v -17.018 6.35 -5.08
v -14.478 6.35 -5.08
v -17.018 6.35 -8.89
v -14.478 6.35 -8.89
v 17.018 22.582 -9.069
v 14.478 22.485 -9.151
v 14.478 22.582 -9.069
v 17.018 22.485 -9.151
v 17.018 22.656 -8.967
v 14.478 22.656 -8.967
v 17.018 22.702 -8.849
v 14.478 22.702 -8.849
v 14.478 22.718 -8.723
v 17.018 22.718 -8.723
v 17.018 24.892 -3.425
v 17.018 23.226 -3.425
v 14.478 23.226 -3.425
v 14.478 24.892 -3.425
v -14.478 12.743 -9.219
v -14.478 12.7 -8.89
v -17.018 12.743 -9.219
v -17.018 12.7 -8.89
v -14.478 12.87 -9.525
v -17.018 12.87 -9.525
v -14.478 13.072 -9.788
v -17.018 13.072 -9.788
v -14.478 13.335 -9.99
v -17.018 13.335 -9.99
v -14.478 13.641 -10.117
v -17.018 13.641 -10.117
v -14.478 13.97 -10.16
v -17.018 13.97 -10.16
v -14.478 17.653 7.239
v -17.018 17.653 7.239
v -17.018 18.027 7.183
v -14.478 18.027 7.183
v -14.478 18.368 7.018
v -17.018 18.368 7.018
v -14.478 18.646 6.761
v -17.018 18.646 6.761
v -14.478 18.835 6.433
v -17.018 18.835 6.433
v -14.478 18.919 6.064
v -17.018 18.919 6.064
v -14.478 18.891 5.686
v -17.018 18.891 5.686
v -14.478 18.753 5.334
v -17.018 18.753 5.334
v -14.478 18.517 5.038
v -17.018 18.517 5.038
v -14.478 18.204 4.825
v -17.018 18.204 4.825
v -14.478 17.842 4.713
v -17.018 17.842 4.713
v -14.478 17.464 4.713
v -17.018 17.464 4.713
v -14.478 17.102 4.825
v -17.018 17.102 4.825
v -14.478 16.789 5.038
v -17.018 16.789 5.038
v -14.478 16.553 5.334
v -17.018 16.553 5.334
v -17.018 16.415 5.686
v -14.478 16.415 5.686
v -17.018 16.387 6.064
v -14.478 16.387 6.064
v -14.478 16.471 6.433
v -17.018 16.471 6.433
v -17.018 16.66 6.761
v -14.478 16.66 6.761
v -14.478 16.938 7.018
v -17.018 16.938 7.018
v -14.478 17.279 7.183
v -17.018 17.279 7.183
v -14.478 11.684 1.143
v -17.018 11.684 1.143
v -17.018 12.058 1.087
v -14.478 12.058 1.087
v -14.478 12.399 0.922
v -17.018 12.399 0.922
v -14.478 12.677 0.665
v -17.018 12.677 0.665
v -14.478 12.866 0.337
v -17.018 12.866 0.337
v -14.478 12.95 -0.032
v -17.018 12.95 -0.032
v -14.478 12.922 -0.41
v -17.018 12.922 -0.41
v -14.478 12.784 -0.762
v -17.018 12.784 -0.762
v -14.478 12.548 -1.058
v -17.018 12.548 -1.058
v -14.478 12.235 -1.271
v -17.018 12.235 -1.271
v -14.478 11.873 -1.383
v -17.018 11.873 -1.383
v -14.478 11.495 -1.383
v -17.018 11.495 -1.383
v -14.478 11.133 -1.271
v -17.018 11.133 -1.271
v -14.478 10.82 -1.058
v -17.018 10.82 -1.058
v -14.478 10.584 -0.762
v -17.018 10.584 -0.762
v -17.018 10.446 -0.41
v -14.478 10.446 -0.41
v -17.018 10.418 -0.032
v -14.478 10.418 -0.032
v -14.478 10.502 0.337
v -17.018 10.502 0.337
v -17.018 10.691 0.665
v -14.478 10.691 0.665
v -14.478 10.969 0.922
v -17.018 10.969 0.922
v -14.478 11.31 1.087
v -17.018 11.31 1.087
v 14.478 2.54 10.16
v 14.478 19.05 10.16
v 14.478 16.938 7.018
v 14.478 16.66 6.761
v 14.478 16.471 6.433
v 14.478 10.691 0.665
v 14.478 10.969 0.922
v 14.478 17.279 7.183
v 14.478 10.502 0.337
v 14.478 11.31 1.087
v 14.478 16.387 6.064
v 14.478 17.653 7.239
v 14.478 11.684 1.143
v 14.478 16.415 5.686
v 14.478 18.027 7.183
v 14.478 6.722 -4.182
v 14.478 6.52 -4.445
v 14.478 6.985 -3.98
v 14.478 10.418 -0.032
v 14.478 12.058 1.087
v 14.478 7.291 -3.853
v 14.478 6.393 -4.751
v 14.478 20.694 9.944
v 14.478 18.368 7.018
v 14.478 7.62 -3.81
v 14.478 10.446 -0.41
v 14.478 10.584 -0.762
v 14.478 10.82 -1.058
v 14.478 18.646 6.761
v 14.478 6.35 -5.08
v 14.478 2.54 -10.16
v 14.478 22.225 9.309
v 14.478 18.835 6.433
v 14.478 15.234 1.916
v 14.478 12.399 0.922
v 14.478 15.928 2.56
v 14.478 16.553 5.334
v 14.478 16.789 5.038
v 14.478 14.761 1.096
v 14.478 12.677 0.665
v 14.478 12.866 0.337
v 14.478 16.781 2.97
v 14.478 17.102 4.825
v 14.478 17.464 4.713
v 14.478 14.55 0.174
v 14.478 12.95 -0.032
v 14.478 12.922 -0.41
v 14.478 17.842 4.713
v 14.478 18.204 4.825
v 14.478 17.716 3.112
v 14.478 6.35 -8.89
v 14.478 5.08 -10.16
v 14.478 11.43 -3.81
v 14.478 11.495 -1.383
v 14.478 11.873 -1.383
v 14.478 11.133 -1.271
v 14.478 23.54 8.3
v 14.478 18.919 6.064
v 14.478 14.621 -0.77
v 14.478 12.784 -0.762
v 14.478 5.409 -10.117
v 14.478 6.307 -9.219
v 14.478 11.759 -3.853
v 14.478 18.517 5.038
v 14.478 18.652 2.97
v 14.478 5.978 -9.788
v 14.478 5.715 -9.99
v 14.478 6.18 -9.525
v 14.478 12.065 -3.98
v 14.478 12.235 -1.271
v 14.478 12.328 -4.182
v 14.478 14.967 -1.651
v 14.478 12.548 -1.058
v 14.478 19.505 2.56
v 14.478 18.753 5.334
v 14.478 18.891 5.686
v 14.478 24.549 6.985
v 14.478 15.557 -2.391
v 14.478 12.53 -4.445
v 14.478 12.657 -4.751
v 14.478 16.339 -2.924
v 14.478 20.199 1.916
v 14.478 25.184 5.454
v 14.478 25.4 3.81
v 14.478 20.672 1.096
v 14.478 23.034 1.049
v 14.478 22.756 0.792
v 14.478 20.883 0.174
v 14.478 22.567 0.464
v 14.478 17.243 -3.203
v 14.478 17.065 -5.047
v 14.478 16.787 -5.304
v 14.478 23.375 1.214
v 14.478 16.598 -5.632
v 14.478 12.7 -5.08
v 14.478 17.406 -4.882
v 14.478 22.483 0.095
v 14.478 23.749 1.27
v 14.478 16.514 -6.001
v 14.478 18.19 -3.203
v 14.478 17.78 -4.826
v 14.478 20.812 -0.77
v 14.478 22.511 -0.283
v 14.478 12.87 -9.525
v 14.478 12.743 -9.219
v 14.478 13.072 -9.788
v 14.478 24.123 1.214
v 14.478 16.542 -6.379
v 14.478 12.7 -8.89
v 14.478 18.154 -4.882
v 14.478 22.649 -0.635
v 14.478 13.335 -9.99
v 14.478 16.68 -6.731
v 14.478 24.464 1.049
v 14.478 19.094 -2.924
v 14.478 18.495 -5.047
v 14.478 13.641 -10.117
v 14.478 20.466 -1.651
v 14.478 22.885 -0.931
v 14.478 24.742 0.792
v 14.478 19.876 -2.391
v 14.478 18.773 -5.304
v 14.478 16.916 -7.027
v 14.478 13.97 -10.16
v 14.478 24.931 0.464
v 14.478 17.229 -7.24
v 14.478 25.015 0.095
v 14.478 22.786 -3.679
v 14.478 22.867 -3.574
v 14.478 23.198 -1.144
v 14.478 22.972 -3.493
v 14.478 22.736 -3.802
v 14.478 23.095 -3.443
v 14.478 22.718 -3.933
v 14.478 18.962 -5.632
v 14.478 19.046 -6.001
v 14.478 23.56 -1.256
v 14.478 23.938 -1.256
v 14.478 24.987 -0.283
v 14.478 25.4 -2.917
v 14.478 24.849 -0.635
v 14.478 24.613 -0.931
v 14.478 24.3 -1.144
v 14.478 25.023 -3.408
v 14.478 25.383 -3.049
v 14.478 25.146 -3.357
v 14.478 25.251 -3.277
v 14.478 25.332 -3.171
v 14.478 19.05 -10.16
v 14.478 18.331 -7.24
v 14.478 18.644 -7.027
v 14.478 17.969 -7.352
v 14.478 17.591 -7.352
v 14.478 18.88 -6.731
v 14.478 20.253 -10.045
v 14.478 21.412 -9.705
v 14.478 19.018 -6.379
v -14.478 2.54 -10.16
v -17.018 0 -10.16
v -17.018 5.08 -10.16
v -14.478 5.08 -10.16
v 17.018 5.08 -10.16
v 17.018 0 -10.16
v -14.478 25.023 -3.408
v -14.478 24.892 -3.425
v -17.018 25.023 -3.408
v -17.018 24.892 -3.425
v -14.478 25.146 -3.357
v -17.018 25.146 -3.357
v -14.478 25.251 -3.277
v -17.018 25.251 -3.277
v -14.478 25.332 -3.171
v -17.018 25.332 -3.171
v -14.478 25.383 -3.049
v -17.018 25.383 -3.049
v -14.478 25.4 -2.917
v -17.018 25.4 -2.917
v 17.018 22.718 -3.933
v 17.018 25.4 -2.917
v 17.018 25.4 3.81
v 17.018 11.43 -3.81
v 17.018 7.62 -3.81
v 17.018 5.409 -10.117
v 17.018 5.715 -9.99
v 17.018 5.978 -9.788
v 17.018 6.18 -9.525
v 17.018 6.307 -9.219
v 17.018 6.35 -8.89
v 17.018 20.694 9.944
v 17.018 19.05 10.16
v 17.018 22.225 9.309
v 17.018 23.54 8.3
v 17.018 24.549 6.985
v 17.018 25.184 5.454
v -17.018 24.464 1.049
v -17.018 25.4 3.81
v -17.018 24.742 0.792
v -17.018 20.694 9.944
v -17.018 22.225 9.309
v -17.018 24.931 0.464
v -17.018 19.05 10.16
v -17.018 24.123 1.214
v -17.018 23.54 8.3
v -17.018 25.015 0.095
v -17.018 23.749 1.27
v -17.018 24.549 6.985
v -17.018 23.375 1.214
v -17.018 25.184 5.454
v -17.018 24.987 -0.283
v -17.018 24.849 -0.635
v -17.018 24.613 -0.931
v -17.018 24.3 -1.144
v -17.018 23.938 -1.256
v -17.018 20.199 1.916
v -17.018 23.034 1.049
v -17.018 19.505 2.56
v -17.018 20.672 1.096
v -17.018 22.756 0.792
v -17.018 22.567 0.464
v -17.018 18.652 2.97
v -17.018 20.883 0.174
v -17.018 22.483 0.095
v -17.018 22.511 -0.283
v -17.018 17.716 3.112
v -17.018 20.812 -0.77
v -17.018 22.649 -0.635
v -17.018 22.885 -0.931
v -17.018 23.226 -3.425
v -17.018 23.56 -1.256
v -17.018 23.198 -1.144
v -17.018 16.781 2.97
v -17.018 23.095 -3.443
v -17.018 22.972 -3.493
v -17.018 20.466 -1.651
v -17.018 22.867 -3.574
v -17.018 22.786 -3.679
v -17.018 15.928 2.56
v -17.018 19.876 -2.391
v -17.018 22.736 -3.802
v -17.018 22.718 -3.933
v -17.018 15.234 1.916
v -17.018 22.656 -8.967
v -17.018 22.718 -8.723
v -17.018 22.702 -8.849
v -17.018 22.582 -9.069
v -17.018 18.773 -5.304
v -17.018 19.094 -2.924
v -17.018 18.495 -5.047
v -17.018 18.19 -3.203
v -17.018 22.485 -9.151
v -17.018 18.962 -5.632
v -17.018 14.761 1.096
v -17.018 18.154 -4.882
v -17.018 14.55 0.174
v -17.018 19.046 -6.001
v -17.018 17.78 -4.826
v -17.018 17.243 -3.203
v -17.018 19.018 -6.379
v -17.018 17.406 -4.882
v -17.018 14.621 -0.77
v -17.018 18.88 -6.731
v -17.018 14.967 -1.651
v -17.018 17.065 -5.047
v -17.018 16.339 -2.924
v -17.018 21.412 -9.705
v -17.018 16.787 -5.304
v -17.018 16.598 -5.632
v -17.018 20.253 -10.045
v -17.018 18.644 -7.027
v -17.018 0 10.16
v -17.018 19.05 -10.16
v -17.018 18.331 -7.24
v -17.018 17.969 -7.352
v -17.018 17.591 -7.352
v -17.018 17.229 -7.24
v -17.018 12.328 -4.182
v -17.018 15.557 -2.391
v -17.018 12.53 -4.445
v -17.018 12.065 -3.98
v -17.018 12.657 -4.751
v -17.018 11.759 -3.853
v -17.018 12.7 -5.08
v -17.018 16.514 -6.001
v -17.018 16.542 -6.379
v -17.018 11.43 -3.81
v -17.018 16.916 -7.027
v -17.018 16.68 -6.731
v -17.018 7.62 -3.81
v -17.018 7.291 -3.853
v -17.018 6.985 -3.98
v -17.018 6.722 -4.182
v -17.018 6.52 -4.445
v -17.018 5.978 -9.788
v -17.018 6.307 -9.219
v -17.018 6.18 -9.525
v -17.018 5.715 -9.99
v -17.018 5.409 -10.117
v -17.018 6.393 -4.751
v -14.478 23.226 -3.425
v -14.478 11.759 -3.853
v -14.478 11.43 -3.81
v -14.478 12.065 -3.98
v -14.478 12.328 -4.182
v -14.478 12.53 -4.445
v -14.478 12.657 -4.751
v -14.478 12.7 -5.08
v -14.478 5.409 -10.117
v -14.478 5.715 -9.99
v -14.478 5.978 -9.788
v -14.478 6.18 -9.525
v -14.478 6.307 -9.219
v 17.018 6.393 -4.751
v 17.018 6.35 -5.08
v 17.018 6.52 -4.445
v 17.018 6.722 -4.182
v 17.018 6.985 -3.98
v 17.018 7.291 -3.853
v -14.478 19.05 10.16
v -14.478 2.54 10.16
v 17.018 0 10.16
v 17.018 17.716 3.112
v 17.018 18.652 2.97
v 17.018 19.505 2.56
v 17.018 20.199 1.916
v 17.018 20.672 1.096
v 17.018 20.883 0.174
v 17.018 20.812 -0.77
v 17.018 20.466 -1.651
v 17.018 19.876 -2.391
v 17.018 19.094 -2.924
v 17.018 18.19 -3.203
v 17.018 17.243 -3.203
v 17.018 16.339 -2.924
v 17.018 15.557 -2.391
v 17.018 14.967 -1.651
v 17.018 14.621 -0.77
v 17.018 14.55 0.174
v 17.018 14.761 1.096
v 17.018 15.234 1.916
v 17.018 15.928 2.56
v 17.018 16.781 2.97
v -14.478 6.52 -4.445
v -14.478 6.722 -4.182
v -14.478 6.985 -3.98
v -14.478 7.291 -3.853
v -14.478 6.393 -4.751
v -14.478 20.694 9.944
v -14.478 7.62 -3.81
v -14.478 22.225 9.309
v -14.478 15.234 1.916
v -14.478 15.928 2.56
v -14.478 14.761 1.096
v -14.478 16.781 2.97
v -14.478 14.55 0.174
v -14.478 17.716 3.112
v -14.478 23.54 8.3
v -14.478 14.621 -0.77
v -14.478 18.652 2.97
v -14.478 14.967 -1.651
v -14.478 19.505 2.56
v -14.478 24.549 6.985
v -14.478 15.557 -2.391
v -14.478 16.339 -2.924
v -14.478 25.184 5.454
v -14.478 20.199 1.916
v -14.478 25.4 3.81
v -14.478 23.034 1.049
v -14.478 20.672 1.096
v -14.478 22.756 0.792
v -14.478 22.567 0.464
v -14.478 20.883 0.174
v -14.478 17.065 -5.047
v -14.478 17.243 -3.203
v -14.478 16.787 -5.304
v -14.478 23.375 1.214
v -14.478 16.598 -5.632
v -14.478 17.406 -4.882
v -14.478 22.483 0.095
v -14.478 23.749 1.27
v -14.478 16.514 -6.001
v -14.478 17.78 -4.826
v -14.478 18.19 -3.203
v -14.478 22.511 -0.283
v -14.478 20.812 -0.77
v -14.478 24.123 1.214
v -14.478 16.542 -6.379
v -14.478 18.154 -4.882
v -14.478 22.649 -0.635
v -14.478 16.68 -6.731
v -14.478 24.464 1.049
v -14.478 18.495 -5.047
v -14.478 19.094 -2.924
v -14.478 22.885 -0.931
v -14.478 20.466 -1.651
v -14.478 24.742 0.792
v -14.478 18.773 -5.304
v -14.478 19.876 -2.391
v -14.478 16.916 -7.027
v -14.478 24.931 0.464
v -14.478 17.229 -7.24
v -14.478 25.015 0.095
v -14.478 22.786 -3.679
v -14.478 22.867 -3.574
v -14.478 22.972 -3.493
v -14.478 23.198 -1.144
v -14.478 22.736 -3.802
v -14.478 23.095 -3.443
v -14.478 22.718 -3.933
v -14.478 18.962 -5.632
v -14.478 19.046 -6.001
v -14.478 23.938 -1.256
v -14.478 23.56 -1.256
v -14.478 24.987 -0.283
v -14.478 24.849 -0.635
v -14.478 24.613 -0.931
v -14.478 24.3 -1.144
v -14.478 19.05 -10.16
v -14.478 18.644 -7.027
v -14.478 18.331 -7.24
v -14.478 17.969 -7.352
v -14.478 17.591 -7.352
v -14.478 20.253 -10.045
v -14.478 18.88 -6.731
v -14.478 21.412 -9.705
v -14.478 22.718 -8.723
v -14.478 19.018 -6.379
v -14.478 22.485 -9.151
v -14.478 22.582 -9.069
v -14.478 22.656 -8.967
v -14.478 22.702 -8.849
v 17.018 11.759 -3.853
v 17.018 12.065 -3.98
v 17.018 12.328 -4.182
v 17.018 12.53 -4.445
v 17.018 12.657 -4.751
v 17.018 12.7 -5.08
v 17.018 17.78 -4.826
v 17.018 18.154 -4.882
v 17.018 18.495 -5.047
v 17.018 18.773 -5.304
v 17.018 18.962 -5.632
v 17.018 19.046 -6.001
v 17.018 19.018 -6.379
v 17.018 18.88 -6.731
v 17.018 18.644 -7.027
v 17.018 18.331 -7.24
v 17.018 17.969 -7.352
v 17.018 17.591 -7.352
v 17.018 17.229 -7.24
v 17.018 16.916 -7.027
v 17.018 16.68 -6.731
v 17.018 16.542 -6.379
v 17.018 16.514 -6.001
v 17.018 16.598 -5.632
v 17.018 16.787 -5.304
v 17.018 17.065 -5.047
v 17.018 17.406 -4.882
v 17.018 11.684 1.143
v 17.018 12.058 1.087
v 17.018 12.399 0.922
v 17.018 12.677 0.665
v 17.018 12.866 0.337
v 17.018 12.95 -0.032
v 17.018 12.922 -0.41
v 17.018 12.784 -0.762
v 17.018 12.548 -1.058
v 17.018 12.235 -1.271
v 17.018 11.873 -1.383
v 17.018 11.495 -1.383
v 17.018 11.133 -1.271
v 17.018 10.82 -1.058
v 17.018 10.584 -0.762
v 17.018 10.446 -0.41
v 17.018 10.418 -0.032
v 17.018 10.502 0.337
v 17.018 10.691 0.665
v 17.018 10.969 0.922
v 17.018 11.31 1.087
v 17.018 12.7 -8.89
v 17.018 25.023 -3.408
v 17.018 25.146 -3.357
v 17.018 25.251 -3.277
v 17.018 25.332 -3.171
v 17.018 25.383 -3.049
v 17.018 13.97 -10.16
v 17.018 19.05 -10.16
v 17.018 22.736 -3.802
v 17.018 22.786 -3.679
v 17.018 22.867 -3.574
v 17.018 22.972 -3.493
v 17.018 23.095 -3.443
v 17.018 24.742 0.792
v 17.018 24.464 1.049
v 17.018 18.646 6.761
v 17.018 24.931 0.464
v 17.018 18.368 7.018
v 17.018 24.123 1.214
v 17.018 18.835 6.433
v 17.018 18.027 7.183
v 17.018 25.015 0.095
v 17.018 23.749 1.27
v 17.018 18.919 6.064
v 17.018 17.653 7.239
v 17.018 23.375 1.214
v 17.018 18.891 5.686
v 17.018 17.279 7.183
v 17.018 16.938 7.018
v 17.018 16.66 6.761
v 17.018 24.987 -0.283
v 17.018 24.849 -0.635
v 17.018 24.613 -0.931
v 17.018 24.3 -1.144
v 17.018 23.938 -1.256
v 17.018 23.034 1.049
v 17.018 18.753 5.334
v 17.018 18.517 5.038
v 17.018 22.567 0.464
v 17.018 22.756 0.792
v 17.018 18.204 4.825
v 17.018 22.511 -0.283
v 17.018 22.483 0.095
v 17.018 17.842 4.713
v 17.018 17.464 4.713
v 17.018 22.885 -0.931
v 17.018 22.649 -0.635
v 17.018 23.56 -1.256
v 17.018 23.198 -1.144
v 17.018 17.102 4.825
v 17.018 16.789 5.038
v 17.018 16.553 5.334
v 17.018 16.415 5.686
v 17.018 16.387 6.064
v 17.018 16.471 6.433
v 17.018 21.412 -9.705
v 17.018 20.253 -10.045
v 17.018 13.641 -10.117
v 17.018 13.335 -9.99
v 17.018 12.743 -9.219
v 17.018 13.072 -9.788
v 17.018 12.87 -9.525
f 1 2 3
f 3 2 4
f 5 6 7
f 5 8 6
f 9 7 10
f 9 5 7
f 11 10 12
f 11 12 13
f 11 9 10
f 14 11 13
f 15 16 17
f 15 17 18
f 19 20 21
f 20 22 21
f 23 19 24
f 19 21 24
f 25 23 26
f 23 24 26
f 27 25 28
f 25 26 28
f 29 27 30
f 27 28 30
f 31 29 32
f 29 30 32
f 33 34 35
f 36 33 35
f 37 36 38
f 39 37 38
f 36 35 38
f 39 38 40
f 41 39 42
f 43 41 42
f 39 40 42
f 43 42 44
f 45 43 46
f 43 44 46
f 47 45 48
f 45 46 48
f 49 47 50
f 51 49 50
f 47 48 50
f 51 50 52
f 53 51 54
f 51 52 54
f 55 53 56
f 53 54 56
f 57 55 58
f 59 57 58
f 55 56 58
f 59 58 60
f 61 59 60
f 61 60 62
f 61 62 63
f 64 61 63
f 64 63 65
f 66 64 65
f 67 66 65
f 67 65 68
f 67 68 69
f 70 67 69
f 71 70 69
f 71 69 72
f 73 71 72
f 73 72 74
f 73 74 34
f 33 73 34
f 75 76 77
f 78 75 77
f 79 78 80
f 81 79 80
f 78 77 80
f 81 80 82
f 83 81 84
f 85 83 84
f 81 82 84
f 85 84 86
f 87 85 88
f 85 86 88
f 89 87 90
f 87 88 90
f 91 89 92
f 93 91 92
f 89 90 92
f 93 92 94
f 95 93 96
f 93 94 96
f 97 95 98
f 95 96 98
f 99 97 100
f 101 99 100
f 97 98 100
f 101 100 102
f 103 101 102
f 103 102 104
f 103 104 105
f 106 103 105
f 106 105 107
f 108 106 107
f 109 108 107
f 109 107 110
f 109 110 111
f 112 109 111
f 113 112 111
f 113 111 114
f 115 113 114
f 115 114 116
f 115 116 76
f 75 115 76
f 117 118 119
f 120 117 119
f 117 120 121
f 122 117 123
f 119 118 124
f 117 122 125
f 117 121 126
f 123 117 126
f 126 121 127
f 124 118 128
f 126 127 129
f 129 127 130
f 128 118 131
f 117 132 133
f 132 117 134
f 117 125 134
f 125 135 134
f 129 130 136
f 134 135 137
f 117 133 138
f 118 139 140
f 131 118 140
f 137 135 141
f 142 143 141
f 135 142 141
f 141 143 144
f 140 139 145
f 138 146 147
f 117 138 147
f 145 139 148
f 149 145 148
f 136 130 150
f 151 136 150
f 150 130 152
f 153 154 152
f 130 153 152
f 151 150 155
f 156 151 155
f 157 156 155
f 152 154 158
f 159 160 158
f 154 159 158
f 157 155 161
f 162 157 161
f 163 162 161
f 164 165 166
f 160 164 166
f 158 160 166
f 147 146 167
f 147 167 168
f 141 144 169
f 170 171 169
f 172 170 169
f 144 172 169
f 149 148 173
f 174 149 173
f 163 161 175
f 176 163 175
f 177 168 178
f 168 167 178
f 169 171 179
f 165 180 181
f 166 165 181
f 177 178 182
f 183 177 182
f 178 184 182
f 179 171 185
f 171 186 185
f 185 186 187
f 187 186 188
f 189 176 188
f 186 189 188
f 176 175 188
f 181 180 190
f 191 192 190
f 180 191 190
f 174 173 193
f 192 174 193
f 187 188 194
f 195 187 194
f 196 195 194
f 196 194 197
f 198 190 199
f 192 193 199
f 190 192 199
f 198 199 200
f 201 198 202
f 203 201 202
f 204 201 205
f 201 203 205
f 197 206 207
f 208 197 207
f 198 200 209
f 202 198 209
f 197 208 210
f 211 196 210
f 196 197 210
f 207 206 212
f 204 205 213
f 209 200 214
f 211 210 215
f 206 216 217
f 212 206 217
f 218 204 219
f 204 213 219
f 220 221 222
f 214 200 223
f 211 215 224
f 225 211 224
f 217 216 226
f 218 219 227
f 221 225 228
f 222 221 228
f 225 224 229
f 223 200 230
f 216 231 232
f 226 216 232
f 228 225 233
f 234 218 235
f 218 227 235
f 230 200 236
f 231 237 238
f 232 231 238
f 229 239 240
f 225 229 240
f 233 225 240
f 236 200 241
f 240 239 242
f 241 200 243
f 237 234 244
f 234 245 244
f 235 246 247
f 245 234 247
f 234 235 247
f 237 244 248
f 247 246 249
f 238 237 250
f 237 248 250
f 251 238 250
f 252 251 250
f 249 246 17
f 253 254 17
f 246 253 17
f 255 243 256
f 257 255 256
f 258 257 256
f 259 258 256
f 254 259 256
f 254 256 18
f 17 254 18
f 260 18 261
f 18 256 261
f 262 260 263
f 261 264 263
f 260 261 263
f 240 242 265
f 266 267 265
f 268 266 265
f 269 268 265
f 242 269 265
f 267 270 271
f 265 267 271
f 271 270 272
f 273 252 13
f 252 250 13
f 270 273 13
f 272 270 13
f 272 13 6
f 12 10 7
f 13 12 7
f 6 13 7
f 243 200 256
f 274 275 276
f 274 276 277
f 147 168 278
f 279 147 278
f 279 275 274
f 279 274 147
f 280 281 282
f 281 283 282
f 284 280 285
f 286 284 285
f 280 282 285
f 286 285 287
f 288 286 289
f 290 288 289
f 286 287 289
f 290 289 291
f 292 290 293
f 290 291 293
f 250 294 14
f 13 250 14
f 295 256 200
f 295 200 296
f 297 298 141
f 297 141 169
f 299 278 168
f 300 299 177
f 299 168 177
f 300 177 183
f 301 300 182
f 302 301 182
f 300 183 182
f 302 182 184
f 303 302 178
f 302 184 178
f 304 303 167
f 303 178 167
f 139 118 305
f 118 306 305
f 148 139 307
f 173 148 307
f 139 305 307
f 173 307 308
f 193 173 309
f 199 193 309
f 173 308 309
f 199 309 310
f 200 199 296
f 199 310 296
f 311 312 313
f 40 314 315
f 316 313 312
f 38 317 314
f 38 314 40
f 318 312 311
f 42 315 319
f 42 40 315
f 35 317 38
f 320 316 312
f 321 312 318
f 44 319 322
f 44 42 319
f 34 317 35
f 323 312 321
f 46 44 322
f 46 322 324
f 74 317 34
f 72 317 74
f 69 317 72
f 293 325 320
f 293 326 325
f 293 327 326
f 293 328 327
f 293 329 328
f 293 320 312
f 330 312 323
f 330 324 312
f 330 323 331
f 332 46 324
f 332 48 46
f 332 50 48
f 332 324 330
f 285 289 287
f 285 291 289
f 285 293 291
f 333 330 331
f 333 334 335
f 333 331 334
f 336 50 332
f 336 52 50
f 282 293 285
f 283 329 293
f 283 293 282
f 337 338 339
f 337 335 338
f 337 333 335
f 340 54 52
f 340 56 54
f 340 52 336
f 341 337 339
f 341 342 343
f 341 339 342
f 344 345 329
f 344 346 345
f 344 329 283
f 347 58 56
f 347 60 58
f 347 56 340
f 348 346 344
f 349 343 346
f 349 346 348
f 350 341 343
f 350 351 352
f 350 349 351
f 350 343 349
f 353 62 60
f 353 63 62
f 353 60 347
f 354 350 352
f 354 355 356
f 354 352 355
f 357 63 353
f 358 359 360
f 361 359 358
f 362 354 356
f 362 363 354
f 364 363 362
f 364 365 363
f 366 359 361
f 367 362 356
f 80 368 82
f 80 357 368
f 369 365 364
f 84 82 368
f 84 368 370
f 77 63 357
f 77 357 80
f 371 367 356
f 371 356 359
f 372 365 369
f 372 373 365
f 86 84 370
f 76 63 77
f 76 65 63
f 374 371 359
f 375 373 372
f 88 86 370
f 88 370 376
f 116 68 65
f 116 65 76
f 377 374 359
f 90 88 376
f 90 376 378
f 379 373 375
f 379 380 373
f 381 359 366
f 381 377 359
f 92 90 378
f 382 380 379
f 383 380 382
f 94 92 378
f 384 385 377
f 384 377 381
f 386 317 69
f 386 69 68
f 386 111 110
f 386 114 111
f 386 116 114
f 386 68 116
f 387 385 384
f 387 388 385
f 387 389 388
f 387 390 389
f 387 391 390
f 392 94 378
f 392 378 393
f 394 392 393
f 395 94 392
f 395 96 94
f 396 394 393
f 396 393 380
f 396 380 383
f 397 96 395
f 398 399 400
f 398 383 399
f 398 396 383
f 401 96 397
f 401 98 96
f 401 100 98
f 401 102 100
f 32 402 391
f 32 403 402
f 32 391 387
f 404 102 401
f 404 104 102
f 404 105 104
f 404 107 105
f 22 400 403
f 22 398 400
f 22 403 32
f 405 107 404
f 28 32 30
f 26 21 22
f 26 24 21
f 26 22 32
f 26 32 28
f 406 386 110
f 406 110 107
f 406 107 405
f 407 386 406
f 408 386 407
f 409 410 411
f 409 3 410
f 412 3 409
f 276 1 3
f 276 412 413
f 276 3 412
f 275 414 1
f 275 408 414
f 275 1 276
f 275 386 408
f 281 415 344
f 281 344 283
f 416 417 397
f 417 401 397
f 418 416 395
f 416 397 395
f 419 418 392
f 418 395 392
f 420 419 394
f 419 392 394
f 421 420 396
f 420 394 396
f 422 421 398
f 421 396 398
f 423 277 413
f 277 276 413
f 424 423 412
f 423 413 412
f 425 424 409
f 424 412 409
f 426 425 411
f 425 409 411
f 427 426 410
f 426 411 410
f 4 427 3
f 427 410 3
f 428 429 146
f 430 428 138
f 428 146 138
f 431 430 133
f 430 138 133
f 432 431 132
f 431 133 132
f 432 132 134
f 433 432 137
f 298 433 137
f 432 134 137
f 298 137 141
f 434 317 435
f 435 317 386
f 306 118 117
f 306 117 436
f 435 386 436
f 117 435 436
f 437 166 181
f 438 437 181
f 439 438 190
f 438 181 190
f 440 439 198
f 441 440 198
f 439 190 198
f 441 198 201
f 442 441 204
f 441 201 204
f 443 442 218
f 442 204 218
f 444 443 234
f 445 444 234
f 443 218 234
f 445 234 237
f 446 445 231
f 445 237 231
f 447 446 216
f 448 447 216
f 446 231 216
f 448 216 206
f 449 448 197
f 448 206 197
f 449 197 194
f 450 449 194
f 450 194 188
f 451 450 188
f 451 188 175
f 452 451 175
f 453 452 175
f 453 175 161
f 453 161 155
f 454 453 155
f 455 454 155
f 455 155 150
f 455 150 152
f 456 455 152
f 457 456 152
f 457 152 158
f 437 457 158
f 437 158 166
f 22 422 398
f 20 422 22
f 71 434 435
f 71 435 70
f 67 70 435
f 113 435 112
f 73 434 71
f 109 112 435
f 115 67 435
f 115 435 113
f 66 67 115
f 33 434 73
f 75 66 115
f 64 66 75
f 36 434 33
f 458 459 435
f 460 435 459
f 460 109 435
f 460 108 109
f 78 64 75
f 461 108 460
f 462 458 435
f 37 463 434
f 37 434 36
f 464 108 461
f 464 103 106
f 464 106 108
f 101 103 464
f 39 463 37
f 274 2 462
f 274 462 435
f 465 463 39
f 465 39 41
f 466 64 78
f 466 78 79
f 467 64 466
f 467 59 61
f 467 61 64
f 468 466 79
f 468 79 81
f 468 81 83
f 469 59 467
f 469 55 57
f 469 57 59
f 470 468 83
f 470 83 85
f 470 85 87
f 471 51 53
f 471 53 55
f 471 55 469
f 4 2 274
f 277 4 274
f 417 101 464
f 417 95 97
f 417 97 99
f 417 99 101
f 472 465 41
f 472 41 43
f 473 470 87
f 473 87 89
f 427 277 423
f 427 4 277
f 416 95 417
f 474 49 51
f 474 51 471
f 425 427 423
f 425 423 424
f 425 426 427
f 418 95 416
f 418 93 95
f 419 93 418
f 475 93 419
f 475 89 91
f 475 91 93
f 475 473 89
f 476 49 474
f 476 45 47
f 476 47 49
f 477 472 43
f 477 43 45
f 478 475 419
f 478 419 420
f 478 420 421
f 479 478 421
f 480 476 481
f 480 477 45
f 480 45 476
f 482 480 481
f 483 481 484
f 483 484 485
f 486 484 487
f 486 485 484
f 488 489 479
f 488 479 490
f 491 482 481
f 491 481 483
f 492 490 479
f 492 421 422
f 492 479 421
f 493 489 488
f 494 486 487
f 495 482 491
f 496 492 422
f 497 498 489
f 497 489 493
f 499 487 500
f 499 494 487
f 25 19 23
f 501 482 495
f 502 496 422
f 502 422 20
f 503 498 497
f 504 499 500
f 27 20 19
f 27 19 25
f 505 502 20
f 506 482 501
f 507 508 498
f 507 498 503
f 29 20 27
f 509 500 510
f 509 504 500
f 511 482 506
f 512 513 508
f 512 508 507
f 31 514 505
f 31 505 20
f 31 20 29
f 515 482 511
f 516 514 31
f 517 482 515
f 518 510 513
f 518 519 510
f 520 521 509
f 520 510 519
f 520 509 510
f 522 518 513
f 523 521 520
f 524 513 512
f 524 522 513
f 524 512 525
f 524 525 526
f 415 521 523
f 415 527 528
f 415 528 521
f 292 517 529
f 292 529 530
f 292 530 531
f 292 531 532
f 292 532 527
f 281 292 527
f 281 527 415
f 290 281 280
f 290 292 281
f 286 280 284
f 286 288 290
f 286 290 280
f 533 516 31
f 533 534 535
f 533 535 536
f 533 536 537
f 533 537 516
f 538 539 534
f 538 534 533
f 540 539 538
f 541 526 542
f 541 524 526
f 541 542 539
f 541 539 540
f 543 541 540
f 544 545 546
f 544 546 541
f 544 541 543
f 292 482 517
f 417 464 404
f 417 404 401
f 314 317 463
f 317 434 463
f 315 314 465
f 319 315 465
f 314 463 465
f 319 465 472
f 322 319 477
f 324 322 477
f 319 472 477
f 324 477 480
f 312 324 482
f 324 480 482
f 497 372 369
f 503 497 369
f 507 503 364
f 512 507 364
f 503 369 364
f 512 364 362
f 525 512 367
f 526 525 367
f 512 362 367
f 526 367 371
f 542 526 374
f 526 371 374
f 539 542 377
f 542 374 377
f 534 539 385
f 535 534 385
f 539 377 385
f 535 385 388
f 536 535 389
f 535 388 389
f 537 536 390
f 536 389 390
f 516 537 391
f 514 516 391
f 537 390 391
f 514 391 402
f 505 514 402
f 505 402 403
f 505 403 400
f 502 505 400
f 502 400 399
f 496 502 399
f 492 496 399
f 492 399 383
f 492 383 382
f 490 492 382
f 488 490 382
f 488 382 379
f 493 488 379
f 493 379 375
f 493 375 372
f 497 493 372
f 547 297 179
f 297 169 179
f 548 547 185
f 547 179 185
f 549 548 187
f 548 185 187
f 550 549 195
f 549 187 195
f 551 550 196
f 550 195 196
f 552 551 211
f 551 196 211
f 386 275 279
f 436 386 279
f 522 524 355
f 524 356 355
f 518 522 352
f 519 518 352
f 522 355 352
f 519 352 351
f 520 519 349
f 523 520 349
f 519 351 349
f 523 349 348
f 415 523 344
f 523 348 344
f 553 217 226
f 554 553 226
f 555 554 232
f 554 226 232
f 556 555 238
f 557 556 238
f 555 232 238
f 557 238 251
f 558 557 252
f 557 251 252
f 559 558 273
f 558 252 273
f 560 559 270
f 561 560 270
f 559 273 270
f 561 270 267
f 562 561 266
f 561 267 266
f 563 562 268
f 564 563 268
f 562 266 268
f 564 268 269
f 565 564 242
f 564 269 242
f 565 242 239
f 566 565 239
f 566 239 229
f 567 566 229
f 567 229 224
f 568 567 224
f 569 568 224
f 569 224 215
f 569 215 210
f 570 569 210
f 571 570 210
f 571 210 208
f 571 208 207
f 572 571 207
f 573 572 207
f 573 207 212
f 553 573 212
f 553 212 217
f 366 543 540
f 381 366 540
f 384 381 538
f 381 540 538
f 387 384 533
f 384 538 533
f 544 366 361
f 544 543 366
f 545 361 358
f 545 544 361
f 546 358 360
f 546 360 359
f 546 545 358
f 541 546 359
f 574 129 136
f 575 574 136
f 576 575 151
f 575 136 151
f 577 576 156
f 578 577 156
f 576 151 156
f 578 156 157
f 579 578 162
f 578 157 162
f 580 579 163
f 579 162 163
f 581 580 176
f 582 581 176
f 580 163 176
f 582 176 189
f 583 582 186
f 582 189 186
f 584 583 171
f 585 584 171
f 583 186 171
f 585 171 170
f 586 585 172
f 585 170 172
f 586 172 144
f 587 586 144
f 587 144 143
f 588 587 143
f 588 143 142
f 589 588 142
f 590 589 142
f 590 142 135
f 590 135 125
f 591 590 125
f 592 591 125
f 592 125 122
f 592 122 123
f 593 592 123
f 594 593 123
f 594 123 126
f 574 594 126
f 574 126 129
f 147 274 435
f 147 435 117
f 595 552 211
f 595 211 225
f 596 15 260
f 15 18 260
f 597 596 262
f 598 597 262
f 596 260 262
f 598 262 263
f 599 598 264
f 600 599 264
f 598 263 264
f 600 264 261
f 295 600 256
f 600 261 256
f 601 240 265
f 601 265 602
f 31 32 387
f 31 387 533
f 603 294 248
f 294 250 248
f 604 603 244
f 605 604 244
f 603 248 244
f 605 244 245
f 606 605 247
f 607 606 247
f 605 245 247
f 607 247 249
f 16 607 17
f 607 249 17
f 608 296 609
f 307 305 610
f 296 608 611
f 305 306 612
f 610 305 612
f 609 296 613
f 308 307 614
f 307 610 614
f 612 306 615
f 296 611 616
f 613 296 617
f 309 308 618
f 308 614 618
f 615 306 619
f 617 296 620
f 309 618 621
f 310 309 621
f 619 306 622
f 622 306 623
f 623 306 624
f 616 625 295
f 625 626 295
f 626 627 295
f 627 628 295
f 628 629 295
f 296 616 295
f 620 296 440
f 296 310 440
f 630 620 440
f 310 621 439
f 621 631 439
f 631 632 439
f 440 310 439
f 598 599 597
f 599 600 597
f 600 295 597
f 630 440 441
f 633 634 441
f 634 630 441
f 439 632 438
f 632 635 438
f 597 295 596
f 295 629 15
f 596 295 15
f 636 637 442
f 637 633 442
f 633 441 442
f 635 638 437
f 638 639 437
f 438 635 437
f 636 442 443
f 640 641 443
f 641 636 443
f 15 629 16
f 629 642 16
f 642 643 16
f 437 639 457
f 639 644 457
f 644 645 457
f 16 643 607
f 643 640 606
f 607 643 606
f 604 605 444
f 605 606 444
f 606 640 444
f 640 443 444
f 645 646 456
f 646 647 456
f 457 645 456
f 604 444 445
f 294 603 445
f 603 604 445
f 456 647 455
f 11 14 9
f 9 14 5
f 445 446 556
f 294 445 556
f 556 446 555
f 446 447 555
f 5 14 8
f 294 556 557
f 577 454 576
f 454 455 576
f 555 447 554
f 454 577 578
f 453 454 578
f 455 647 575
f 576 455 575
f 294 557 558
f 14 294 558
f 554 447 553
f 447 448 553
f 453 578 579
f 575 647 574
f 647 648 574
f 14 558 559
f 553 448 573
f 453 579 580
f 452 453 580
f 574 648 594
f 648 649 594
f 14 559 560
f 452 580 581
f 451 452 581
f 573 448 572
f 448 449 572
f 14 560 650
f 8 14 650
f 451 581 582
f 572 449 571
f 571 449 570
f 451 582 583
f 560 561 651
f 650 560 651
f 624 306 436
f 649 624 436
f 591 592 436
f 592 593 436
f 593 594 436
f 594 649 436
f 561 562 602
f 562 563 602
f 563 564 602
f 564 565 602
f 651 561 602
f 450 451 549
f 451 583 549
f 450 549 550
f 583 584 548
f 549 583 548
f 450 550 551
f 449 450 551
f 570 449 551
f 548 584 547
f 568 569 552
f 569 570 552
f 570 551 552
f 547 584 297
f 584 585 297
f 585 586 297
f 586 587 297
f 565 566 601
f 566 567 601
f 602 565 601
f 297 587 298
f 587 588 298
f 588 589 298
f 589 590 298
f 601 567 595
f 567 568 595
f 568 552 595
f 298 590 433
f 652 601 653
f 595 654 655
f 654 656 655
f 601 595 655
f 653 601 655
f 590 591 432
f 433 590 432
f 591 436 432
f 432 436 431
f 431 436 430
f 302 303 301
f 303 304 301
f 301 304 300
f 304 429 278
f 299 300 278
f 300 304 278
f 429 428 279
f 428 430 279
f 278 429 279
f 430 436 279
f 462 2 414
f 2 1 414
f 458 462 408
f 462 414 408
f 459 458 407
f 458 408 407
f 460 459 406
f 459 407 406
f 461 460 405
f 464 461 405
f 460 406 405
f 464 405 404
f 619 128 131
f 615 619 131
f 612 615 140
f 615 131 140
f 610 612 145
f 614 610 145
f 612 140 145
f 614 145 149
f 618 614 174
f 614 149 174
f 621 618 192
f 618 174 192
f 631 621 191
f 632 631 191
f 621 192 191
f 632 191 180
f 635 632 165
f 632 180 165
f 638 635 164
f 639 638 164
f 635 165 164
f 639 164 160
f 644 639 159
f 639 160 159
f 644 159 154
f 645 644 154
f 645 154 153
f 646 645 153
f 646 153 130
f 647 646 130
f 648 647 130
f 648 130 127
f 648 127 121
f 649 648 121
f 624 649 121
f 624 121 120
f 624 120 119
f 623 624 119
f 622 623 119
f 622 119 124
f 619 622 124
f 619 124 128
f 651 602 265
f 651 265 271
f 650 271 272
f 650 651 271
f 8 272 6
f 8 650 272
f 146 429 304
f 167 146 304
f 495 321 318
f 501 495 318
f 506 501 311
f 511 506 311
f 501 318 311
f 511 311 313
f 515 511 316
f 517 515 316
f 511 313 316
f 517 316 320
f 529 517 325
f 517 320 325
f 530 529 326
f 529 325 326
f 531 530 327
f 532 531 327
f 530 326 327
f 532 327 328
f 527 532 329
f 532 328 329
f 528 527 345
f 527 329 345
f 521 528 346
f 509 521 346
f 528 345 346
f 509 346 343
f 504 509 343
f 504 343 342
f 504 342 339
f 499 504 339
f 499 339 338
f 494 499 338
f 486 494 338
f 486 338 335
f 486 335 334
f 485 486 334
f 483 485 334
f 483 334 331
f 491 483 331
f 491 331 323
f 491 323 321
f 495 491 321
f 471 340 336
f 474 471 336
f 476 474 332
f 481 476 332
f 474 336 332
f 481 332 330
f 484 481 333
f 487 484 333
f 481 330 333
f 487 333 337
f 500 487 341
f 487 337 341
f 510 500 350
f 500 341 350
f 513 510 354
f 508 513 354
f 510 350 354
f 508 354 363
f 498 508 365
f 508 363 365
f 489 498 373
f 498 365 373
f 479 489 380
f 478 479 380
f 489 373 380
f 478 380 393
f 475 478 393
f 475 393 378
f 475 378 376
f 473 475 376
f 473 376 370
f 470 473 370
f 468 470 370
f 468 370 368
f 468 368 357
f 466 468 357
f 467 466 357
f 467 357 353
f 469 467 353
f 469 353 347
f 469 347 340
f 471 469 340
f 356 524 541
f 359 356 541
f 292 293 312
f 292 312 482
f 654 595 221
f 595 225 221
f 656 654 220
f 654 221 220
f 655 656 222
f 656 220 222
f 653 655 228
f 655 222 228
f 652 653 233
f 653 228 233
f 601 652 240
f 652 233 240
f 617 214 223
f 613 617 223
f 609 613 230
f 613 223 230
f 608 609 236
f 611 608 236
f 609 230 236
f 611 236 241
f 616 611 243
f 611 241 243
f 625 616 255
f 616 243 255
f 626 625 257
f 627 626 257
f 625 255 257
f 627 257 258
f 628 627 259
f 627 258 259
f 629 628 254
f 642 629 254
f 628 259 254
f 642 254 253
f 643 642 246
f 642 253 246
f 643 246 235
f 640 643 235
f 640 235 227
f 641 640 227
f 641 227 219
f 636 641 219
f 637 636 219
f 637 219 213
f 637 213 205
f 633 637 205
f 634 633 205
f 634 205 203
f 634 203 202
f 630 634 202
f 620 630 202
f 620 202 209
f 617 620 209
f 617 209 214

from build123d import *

# Parameters (mm, degrees)
SKETCH1_W           = 34.036
SKETCH1_H           = 20.32
BOSS_EXTRUDE1_DEPTH = 25.4
SKETCH2_W           = 28.956
SKETCH2_H           = 20.32
CUT_EXTRUDE1_DEPTH  = 22.86
SKETCH3_R           = 1.27
SKETCH3_R_2         = 3.175
CUT_EXTRUDE2_DEPTH  = 44.667320687
FILLET2_R           = 6.35
SKETCH8_W           = 6.35
SKETCH8_H           = 6.35
CUT_EXTRUDE5_DEPTH  = 44.667320687
FILLET4_R           = 1.27
SKETCH10_W          = 10.777132928
SKETCH10_H          = 6.217576688
CUT_EXTRUDE6_DEPTH  = 44.667320687
FILLET6_R           = 0.508


with BuildPart() as part:
    # Sketch1 → Boss-Extrude1 (new body)
    with BuildSketch(Plane(origin=(0, 0, 0), x_dir=(1, 0, 0), z_dir=(0, 1, 0))):
        Rectangle(SKETCH1_W, SKETCH1_H)
    extrude(amount=BOSS_EXTRUDE1_DEPTH)

    # Sketch2 → Cut-Extrude1 (cut)
    with BuildSketch(Plane(origin=(0, 25.4, 0), x_dir=(1, 0, 0), z_dir=(0, 1, 0))):
        Rectangle(SKETCH2_W, SKETCH2_H)
    extrude(amount=-CUT_EXTRUDE1_DEPTH, mode=Mode.SUBTRACT)

    # Sketch3 → Cut-Extrude2 (cut, through all)
    with BuildSketch(Plane.ZY.offset(17.018)):
        with Locations((0, 23.749)):
            Circle(SKETCH3_R)
        with Locations((-6.096, 17.78)):
            Circle(SKETCH3_R)
        with Locations((-0.127, 11.684)):
            Circle(SKETCH3_R)
        with Locations((5.969, 17.653)):
            Circle(SKETCH3_R)
        with Locations((-0.0635, 17.7165)):
            Circle(SKETCH3_R_2)
    extrude(amount=-CUT_EXTRUDE2_DEPTH, mode=Mode.SUBTRACT)

    # Fillet2
    fillet2_edges = [part.edges().sort_by_distance(p)[0] for p in [
        (-15.748, 25.4, -10.16),
        (15.748, 25.4, 10.16),
        (-15.748, 25.4, 10.16),
        (15.748, 25.4, -10.16),
    ]]
    fillet(fillet2_edges, radius=FILLET2_R)

    # Sketch8 → Cut-Extrude5 (cut, through all)
    with BuildSketch(Plane(origin=(17.018, 0, 0), x_dir=(0, 0, -1), z_dir=(1, 0, 0))):
        with Locations((6.985, 9.525)):
            Rectangle(SKETCH8_W, SKETCH8_H)
    extrude(amount=-CUT_EXTRUDE5_DEPTH, mode=Mode.SUBTRACT)

    # Fillet4
    fillet4_edges = [part.edges().sort_by_distance(p)[0] for p in [
        (15.748, 12.7, -10.16),
        (-15.748, 12.7, -10.16),
        (15.748, 6.35, -10.16),
        (-15.748, 6.35, -10.16),
        (15.748, 6.35, -3.81),
        (-15.748, 6.35, -3.81),
        (15.748, 12.7, -3.81),
        (-15.748, 12.7, -3.81),
    ]]
    fillet(fillet4_edges, radius=FILLET4_R)

    # Sketch10 → Cut-Extrude6 (cut, through all)
    with BuildSketch(Plane(origin=(17.018, 0, 0), x_dir=(0, 0, -1), z_dir=(1, 0, 0))):
        with Locations((8.813956002, 25.827034075)):
            Rectangle(SKETCH10_W, SKETCH10_H)
    extrude(amount=-CUT_EXTRUDE6_DEPTH, mode=Mode.SUBTRACT)

    # Fillet6
    fillet6_edges = [part.edges().sort_by_distance(p)[0] for p in [
        (-15.748, 22.718245731, -8.993287881),
        (15.748, 25.4, -3.425389538),
        (15.748, 22.718245731, -3.425389538),
        (-15.748, 25.4, -3.425389538),
        (-15.748, 22.718245731, -3.425389538),
        (15.748, 22.718245731, -8.993287881),
    ]]
    fillet(fillet6_edges, radius=FILLET6_R)


solid = part.part
